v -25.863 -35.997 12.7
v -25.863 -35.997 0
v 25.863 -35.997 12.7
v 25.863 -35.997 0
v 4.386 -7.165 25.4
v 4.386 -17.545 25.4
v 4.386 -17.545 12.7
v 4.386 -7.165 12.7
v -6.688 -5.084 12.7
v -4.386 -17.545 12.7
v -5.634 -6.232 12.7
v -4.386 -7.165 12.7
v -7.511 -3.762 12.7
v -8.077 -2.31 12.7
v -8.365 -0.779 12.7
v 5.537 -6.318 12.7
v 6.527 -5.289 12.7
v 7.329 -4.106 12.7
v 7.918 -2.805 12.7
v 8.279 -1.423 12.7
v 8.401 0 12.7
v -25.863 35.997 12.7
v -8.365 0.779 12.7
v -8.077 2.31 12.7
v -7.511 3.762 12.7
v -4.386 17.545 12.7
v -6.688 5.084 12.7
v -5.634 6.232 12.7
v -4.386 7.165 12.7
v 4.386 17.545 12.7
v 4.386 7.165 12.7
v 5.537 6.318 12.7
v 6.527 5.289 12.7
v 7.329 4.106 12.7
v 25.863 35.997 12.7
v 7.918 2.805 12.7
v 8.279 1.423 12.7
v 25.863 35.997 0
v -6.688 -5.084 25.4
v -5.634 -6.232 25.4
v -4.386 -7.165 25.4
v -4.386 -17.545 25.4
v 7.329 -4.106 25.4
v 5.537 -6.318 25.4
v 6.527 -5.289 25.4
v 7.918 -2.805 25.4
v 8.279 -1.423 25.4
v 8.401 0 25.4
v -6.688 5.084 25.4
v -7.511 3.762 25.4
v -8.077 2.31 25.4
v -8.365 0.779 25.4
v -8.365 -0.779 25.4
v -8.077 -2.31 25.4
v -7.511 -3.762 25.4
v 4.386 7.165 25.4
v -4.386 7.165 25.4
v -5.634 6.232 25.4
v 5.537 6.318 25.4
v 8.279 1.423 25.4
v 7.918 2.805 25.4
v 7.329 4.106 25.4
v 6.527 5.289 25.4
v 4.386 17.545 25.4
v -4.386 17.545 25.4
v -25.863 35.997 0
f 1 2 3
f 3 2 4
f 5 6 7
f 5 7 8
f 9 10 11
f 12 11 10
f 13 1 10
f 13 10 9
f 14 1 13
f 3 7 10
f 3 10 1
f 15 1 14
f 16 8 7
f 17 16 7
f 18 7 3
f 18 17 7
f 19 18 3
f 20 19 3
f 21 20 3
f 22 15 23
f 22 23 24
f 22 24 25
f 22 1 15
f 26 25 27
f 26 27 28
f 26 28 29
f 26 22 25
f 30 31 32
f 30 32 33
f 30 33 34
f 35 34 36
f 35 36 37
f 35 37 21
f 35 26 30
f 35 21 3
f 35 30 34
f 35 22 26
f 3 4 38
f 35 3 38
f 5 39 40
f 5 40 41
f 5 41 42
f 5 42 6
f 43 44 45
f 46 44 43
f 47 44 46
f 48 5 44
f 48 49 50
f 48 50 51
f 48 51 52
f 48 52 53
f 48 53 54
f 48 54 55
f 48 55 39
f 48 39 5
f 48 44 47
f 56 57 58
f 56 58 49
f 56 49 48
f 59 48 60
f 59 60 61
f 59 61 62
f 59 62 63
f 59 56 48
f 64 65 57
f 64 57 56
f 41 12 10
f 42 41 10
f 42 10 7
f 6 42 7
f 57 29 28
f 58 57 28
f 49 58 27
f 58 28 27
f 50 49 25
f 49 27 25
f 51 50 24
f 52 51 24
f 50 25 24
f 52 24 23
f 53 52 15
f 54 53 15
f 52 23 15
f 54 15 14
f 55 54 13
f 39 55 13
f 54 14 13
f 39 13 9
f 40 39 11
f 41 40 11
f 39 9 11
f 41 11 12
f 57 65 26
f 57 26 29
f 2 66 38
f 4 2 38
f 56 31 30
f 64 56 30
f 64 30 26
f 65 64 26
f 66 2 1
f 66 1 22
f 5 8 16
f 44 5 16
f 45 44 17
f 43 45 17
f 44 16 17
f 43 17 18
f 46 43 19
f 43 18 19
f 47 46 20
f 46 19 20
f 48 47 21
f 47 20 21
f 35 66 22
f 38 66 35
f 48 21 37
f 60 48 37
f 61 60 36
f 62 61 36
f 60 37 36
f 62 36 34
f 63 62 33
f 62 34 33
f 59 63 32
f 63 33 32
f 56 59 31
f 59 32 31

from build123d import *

# Parameters (mm, degrees)
F1_DEPTH = 25.4
F0_W     = 51.7266914248
F0_H     = 71.9938799739
F2_DEPTH = 12.7


with BuildPart() as f1:
    # F0 (on Top) → F1 (new body)
    with BuildSketch(Plane.XY):
        with BuildLine():
            ThreePointArc((4.3861824088, -7.1647320158), (7.3286779539, -4.1063926297), (8.4007131233, 0))
            ThreePointArc((8.4007131233, 0), (7.3286779539, 4.1063926297), (4.3861824088, 7.1647320158))
            Line((4.3861824088, 7.1647320158), (4.3861824088, -7.1647320158))
        make_face()
        with BuildLine():
            Line((4.3861824088, -7.1647320158), (4.3861824088, 7.1647320158))
            ThreePointArc((4.3861824088, 7.1647320158), (0, 8.4007131233), (-4.3861824088, 7.1647320158))
            Line((-4.3861824088, 7.1647320158), (-4.3861824088, -7.1647320158))
            ThreePointArc((-4.3861824088, -7.1647320158), (0, -8.4007131233), (4.3861824088, -7.1647320158))
        make_face()
        with BuildLine():
            Line((-4.3861824088, -7.1647320158), (-4.3861824088, 7.1647320158))
            ThreePointArc((-4.3861824088, 7.1647320158), (-8.4007131233, 0), (-4.3861824088, -7.1647320158))
        make_face()
        with BuildLine():
            Line((4.3861824088, -17.5447259098), (4.3861824088, -7.1647320158))
            ThreePointArc((4.3861824088, -7.1647320158), (0, -8.4007131233), (-4.3861824088, -7.1647320158))
            Line((-4.3861824088, -7.1647320158), (-4.3861824088, -17.5447259098))
            Line((-4.3861824088, -17.5447259098), (4.3861824088, -17.5447259098))
        make_face()
        with BuildLine():
            ThreePointArc((-4.3861824088, 7.1647320158), (0, 8.4007131233), (4.3861824088, 7.1647320158))
            Line((4.3861824088, 7.1647320158), (4.3861824088, 17.5447259098))
            Line((4.3861824088, 17.5447259098), (-4.3861824088, 17.5447259098))
            Line((-4.3861824088, 17.5447259098), (-4.3861824088, 7.1647320158))
        make_face()
    extrude(amount=F1_DEPTH)

    # F0 (on Top) → F2 (join)
    with BuildSketch(Plane.XY):
        Rectangle(F0_W, F0_H)
        with BuildLine():
            ThreePointArc((4.3861824088, 7.1647320158), (7.3286779539, 4.1063926297), (8.4007131233, 0))
            ThreePointArc((8.4007131233, 0), (7.3286779539, -4.1063926297), (4.3861824088, -7.1647320158))
            Line((4.3861824088, -7.1647320158), (4.3861824088, -17.5447259098))
            Line((4.3861824088, -17.5447259098), (-4.3861824088, -17.5447259098))
            Line((-4.3861824088, -17.5447259098), (-4.3861824088, -7.1647320158))
            ThreePointArc((-4.3861824088, -7.1647320158), (-8.4007131233, 0), (-4.3861824088, 7.1647320158))
            Line((-4.3861824088, 7.1647320158), (-4.3861824088, 17.5447259098))
            Line((-4.3861824088, 17.5447259098), (4.3861824088, 17.5447259098))
            Line((4.3861824088, 17.5447259098), (4.3861824088, 7.1647320158))
        make_face(mode=Mode.SUBTRACT)
    extrude(amount=F2_DEPTH)


solid = f1.part
